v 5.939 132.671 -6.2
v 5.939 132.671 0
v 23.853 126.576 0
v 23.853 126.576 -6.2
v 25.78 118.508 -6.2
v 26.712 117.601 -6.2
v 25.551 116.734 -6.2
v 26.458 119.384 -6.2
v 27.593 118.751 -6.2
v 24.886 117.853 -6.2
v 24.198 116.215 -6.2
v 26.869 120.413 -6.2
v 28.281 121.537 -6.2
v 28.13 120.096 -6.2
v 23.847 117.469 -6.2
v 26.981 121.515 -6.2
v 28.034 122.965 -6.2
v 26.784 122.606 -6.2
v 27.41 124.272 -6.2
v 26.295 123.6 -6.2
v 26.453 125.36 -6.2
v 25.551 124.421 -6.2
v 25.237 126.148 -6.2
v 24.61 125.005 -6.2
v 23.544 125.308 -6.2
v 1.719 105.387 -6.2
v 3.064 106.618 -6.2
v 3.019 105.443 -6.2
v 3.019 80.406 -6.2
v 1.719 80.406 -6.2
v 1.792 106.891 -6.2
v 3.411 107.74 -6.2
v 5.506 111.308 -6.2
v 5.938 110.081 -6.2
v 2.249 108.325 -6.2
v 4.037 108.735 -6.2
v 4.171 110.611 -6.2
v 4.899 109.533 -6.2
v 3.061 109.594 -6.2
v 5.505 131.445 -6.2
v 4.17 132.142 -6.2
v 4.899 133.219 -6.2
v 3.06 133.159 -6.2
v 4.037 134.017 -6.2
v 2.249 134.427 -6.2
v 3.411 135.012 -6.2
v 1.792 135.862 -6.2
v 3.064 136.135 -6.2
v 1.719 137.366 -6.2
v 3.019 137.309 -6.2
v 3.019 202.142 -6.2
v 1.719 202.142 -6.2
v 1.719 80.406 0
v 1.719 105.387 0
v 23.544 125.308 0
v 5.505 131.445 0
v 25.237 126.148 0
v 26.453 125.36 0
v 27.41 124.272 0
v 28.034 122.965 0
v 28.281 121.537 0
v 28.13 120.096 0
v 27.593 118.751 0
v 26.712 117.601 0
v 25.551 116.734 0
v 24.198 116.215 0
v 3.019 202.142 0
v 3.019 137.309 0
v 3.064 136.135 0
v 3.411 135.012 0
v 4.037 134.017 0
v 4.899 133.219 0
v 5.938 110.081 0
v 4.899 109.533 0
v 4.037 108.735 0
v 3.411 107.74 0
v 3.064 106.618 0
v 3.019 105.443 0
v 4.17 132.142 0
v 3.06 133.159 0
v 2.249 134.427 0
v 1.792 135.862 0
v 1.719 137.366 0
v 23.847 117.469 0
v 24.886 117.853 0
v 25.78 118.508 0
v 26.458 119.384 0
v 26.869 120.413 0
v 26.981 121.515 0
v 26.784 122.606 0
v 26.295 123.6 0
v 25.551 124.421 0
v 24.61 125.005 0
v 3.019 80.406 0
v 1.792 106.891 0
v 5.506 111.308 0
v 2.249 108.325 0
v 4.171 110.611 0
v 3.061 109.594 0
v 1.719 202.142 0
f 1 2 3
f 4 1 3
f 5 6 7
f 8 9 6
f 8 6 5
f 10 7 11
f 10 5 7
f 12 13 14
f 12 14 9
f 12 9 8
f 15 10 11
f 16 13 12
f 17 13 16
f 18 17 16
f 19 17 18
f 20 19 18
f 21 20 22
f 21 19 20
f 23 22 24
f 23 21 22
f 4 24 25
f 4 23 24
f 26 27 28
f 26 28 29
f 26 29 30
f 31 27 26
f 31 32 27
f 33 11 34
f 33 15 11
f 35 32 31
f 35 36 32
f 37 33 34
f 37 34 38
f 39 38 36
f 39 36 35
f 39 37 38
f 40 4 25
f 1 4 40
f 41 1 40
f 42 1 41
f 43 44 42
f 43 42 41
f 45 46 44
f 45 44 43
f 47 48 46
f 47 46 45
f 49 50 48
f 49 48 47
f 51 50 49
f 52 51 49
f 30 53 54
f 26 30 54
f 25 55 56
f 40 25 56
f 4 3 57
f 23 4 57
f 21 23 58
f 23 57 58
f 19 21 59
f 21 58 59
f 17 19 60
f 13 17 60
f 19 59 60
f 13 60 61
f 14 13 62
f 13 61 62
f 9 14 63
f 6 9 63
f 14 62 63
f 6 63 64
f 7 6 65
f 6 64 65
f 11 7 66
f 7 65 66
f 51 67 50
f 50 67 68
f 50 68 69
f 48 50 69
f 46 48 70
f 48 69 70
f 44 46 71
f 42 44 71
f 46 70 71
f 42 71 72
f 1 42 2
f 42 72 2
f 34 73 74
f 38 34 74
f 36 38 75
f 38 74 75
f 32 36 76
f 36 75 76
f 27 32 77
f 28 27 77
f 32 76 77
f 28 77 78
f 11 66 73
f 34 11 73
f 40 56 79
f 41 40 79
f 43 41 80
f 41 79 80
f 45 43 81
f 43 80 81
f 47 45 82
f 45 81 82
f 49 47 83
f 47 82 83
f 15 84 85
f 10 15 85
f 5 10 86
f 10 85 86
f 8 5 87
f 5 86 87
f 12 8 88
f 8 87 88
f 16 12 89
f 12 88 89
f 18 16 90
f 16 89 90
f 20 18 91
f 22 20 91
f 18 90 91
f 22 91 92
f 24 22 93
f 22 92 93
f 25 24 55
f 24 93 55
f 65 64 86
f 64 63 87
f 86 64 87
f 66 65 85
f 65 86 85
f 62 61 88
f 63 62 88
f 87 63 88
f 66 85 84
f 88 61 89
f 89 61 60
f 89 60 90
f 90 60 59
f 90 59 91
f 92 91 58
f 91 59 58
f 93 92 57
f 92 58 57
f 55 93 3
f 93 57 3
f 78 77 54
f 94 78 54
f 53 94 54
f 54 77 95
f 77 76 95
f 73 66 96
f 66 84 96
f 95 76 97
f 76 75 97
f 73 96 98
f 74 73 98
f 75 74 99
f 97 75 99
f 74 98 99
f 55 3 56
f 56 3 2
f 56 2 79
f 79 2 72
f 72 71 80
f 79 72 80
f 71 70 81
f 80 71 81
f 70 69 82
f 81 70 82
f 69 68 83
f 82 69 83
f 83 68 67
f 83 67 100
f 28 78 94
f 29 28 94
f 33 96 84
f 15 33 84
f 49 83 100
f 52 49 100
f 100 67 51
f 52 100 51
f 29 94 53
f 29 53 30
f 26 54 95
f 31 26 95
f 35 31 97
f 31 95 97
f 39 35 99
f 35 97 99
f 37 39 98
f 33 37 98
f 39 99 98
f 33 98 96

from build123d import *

# Parameters (mm, degrees)
BOSS_EXTRUDE1_DEPTH = 6.2
SKETCH2_W           = 22.942955783
SKETCH2_H           = 33.63345143
CUT_EXTRUDE1_DEPTH  = 10
SKETCH3_W           = 6.2
SKETCH3_H           = 21.335576668
CUT_EXTRUDE2_DEPTH  = 10
SKETCH4_W           = 6.2
SKETCH4_H           = 34.092468675
CUT_EXTRUDE3_DEPTH  = 10


with BuildPart() as part:
    # Sketch1 → Boss-Extrude1 (new body)
    with BuildSketch(Plane.XY):
        with BuildLine():
            Line((5.938584497, 132.670572888), (23.853053602, 126.575547243))
            ThreePointArc((23.853053602, 126.575547243), (28.280634989, 121.537232872), (24.198169049, 116.215432378))
            Line((24.198169049, 116.215432378), (5.937692527, 110.081409755))
            ThreePointArc((5.937692527, 110.081409755), (3.69123593, 108.257803943), (3.019475766, 105.443404596))
            Line((3.019475766, 105.443404596), (3.019475766, 19.274702795))
            Line((3.019475766, 19.274702795), (1.719475766, 19.274702795))
            Line((1.719475766, 19.274702795), (1.719475766, 105.386747909))
            ThreePointArc((1.719475766, 105.386747909), (2.613791193, 108.9861771), (5.506131352, 111.307827159))
            Line((5.506131352, 111.307827159), (23.847136202, 117.468900696))
            ThreePointArc((23.847136202, 117.468900696), (26.980585626, 121.515340919), (23.543843406, 125.30756806))
            Line((23.543843406, 125.30756806), (5.504633735, 131.445034089))
            ThreePointArc((5.504633735, 131.445034089), (2.6133616, 133.766807499), (1.719475766, 137.365564846))
            Line((1.719475766, 137.365564846), (1.719475766, 223.477609961))
            Line((1.719475766, 223.477609961), (3.019475766, 223.477609961))
            Line((3.019475766, 223.477609961), (3.019475766, 137.30890816))
            ThreePointArc((3.019475766, 137.30890816), (3.691489205, 134.494106323), (5.938584497, 132.670572888))
        make_face()
    extrude(amount=-BOSS_EXTRUDE1_DEPTH)

    # Sketch2 → Cut-Extrude1 (cut)
    with BuildSketch(Plane.ZY.offset(-1.719475766)):
        with Locations((-7.178599834, 29.49715685)):
            Rectangle(SKETCH2_W, SKETCH2_H)
    extrude(amount=-CUT_EXTRUDE1_DEPTH, mode=Mode.SUBTRACT)

    # Sketch3 → Cut-Extrude2 (cut)
    with BuildSketch(Plane(origin=(3.019475766, 0, 0), x_dir=(0, 0, -1), z_dir=(1, 0, 0))):
        with Locations((3.1, 212.809821627)):
            Rectangle(SKETCH3_W, SKETCH3_H)
    extrude(amount=-CUT_EXTRUDE2_DEPTH, mode=Mode.SUBTRACT)

    # Sketch4 → Cut-Extrude3 (cut)
    with BuildSketch(Plane(origin=(3.019475766, 0, 0), x_dir=(0, 0, -1), z_dir=(1, 0, 0))):
        with Locations((3.1, 63.360116903)):
            Rectangle(SKETCH4_W, SKETCH4_H)
    extrude(amount=-CUT_EXTRUDE3_DEPTH, mode=Mode.SUBTRACT)


solid = part.part
